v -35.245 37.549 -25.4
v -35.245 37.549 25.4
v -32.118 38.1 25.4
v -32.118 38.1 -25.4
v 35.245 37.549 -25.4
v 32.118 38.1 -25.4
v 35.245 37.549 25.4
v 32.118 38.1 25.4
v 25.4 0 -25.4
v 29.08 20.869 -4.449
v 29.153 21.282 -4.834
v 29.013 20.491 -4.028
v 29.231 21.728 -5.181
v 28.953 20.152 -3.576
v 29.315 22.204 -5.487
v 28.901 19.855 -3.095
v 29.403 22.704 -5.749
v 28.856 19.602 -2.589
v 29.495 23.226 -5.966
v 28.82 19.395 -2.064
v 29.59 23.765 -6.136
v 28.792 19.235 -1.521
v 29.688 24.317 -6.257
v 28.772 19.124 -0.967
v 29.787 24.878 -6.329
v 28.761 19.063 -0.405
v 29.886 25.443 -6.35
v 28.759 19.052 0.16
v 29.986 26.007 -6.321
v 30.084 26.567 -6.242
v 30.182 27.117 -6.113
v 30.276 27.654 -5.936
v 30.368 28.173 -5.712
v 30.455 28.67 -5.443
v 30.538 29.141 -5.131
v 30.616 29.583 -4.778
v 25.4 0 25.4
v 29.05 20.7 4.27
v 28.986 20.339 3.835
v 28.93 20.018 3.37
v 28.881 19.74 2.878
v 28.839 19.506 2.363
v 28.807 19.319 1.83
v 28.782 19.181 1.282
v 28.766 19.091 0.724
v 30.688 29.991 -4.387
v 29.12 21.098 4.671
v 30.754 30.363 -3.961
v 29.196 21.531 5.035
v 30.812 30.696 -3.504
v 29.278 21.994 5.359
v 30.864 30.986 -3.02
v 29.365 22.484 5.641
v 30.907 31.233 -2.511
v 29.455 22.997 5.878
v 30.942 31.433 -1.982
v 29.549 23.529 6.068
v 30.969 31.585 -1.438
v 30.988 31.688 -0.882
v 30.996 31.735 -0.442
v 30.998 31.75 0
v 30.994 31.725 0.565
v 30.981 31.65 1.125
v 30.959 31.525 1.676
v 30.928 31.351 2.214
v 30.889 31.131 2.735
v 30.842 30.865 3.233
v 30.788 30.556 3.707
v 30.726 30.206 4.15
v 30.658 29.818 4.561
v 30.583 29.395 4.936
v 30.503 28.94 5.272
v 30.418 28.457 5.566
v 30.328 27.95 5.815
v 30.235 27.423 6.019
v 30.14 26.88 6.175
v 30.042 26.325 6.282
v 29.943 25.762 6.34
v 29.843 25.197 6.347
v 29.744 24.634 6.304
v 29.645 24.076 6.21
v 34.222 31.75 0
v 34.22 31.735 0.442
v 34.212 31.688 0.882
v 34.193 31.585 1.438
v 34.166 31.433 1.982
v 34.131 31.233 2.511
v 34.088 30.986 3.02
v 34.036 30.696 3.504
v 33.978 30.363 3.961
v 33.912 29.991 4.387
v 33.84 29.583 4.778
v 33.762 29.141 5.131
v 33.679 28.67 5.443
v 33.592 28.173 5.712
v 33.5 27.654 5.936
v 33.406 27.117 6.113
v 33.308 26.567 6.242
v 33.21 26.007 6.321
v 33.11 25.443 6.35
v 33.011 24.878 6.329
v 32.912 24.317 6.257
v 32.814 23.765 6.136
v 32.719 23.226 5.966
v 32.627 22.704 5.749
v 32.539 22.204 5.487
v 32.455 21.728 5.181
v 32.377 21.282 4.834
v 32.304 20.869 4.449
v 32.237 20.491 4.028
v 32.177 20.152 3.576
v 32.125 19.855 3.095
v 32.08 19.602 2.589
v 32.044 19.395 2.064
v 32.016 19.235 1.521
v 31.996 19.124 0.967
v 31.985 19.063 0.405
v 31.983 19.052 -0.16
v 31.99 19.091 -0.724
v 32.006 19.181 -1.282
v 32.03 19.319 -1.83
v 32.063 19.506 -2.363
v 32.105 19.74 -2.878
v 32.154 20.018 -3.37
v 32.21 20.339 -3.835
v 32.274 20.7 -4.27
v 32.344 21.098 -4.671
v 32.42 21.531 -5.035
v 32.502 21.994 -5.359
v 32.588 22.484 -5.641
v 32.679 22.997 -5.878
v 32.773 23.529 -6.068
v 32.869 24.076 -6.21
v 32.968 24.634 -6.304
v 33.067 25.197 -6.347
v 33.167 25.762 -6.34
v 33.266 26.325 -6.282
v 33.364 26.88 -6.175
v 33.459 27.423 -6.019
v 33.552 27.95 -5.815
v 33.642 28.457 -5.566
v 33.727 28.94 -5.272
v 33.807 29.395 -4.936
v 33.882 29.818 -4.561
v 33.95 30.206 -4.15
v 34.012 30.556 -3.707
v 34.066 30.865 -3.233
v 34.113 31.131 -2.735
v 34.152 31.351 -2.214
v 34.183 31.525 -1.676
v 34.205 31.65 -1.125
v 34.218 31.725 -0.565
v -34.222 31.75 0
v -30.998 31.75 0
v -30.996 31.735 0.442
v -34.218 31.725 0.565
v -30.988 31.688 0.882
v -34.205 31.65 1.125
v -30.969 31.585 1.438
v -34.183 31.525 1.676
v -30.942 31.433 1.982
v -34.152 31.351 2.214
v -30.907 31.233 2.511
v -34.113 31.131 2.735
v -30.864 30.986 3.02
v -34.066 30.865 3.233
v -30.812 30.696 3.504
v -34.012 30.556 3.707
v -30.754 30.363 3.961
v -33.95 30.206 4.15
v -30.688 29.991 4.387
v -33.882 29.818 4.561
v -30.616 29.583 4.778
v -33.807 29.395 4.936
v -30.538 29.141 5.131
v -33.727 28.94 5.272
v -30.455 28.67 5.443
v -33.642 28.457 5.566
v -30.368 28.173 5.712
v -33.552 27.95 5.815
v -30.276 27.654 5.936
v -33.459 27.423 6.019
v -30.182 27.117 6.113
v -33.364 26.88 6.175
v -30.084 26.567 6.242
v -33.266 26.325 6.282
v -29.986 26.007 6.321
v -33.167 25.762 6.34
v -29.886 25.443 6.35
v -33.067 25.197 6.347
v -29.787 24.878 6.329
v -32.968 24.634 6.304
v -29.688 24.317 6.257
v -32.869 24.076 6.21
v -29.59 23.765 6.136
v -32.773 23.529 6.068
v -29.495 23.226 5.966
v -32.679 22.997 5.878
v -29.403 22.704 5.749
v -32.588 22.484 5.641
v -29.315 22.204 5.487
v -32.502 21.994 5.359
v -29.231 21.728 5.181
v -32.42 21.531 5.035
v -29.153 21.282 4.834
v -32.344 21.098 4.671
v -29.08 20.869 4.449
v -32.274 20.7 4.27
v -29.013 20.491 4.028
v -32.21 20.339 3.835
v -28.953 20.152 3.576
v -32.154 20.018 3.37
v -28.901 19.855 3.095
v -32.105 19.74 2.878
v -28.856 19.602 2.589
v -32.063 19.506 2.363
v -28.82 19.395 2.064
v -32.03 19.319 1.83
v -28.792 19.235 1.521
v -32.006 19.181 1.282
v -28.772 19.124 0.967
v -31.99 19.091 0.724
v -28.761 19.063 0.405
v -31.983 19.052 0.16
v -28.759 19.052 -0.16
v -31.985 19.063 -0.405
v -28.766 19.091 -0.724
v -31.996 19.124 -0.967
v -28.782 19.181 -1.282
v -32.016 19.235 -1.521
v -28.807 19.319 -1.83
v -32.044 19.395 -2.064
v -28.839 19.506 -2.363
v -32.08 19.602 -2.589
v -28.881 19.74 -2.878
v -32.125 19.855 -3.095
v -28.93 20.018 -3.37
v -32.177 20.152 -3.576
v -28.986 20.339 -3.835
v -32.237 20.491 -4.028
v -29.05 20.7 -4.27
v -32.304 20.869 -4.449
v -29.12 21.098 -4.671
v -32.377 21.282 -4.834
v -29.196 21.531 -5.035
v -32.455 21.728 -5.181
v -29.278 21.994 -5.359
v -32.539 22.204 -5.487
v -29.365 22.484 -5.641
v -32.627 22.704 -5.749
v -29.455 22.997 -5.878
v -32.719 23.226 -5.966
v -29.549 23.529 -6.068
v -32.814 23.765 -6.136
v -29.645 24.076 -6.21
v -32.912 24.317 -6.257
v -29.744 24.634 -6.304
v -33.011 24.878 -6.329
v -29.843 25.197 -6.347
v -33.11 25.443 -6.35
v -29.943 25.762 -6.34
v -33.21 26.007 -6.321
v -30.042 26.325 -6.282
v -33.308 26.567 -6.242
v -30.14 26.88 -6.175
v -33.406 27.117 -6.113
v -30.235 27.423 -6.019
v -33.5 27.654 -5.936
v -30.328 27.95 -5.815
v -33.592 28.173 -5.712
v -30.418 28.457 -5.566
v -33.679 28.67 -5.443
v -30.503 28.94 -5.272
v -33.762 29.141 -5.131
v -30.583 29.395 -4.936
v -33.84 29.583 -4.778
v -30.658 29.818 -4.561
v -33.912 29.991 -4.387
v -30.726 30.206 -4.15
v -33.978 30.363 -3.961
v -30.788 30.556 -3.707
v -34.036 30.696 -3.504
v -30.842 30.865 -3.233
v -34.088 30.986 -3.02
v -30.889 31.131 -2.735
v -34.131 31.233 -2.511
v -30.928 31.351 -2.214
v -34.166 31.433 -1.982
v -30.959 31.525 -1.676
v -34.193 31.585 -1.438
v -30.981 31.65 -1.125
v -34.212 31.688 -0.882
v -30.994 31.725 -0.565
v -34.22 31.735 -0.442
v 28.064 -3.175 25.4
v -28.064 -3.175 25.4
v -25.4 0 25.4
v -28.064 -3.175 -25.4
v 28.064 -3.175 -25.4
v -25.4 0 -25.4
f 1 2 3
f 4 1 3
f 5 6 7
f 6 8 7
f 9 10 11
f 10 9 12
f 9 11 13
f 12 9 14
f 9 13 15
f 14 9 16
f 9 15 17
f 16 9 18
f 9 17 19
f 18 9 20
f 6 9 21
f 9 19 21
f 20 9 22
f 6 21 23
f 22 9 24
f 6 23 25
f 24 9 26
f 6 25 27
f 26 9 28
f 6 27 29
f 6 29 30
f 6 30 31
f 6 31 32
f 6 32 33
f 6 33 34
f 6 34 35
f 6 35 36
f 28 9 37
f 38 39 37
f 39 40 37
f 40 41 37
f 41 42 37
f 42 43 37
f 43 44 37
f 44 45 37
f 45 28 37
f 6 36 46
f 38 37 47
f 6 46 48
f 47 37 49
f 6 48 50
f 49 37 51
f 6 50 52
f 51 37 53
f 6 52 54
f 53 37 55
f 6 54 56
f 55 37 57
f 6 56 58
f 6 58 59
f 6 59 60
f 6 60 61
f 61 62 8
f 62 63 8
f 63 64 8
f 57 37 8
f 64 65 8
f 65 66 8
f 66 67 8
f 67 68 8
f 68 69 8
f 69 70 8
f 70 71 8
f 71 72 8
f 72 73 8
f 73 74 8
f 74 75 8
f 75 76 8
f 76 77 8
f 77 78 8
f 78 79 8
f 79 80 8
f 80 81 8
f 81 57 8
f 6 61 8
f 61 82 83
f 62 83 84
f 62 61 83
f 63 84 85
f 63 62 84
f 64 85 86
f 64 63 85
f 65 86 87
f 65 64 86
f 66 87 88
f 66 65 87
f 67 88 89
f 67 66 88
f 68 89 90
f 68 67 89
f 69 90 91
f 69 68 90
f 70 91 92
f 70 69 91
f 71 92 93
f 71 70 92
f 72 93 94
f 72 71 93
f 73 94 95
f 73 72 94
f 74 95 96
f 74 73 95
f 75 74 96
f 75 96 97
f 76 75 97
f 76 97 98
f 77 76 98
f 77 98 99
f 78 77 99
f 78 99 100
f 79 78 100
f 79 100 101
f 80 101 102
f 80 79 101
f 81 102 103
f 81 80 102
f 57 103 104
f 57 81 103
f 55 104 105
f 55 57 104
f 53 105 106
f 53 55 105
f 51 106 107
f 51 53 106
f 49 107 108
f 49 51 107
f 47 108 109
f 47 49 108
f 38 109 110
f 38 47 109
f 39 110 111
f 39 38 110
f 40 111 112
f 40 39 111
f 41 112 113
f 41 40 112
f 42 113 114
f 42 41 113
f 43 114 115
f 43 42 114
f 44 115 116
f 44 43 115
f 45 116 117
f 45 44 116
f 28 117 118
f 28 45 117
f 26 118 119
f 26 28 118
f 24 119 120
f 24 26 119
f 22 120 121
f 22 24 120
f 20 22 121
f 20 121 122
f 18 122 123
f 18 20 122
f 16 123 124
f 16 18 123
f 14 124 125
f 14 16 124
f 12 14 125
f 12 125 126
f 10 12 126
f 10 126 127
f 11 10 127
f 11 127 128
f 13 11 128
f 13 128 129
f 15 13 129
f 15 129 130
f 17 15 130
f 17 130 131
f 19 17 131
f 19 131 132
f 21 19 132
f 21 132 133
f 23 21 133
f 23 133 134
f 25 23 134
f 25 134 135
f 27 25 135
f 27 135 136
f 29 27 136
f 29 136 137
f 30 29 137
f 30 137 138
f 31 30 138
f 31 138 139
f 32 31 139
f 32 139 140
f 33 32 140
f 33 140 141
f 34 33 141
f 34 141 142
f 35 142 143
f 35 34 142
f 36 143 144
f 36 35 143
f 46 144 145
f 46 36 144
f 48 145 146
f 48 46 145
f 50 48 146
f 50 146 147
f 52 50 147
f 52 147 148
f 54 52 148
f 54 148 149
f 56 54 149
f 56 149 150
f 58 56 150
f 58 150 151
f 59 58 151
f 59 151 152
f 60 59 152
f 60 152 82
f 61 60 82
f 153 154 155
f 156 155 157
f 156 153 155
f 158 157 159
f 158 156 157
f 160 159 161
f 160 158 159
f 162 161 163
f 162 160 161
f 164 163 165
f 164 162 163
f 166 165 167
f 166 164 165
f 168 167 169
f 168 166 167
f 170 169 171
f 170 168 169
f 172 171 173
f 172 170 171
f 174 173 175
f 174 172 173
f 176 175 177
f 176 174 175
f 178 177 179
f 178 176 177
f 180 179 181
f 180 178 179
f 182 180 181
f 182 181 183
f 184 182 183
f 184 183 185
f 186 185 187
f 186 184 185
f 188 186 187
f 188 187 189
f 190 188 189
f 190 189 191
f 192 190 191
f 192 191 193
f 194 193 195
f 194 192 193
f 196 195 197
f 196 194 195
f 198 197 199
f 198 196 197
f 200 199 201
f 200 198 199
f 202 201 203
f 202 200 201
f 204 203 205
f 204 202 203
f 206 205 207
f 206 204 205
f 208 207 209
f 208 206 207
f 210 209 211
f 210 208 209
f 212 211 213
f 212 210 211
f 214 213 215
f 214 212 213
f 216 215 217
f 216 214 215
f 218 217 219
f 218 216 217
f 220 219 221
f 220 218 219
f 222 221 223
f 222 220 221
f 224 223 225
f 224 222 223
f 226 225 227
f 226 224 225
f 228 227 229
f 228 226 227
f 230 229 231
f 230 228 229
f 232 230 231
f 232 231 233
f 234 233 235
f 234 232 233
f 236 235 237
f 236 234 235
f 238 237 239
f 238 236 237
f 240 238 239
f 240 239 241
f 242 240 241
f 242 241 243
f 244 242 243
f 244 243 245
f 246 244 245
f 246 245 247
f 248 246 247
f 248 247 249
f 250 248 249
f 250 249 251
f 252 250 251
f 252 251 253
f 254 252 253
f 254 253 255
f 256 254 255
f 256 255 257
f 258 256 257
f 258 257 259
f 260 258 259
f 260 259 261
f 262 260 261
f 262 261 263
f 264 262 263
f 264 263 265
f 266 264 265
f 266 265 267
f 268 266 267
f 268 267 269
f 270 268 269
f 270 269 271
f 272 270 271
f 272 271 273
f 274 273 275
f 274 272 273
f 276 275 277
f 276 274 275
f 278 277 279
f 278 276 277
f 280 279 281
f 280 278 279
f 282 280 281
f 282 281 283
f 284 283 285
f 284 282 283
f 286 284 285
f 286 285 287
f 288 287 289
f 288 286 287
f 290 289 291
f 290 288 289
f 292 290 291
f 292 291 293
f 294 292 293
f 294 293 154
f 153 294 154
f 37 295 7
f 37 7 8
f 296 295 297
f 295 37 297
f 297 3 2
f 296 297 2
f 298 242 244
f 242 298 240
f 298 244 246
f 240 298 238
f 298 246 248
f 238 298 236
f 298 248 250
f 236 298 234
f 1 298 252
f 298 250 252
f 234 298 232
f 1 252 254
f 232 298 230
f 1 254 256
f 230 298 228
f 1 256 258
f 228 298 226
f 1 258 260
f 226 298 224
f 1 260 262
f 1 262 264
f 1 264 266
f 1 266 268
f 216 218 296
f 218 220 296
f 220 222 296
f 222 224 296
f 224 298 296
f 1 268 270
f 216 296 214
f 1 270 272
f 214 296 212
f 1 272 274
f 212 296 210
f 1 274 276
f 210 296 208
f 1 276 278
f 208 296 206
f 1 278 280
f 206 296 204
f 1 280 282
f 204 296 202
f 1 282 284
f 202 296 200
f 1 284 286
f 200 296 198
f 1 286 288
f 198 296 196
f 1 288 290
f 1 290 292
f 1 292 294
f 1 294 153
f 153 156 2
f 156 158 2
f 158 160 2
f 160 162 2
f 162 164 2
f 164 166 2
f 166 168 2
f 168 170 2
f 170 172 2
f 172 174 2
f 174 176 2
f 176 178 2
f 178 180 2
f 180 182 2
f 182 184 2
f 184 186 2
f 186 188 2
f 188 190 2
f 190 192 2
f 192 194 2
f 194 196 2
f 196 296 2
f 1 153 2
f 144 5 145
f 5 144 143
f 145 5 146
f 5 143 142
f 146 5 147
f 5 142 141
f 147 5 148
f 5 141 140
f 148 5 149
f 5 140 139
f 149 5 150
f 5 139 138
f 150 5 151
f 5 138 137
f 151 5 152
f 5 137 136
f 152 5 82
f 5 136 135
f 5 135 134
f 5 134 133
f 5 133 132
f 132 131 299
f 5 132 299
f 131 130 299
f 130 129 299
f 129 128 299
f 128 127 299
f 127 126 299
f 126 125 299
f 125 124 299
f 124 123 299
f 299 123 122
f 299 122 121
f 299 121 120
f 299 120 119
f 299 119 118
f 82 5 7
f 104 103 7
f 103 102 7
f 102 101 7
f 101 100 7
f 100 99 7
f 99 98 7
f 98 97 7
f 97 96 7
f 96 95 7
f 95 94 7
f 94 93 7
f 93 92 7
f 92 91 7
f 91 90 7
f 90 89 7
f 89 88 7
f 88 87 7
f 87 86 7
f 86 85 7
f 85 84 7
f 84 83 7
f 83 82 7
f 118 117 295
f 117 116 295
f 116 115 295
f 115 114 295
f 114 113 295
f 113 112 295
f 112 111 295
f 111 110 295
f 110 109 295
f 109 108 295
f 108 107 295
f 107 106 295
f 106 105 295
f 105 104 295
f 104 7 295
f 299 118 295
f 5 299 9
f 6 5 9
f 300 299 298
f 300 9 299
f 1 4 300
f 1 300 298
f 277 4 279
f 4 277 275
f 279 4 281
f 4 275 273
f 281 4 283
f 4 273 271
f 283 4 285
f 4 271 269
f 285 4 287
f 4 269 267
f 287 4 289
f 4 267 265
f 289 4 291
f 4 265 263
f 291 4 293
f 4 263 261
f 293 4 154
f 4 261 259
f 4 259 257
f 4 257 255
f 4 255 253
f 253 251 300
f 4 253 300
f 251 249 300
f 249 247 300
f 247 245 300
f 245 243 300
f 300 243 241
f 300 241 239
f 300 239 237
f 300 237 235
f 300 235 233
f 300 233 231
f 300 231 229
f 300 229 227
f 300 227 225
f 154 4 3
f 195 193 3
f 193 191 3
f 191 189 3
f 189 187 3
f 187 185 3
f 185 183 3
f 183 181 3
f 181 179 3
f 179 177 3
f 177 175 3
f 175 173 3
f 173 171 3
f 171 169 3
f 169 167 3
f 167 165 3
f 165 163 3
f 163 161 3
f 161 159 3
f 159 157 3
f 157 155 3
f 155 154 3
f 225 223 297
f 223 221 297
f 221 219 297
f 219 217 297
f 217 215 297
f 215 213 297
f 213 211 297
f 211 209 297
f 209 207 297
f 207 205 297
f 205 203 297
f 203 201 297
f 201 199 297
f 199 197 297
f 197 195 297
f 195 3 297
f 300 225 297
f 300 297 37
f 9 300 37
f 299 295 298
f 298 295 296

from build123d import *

# Parameters (mm, degrees)
BOSS_EXTRUDE1_DEPTH     = 25.4
CUT_EXTRUDE1_DEPTH      = 58.783799795
CUT_EXTRUDE1_DEPTH_BACK = 58.783799795
SKETCH2_R               = 6.35


with BuildPart() as part:
    # Sketch1 → Boss-Extrude1 (new, symmetric)
    with BuildSketch(Plane.XY):
        Polygon((-25.4, 0), (25.4, 0), (32.118057965, 38.1), (35.244822581, 37.548667036), (28.064141329, -3.175), (-28.064141329, -3.175), (-35.244822581, 37.548667036), (-32.118057965, 38.1), align=None)
    extrude(amount=BOSS_EXTRUDE1_DEPTH, both=True)

    # Sketch2 → Cut-Extrude1 (cut, two sides: drawn at the far end of the back side and taken through both)
    with BuildSketch(Plane(origin=(0, 0, 0), x_dir=(0, 0, -1), z_dir=(1, 0, 0)).offset(-CUT_EXTRUDE1_DEPTH_BACK)):
        with Locations(Location((0, 25.4, 0), (0, 0, 90))):
            Circle(SKETCH2_R)
    extrude(amount=CUT_EXTRUDE1_DEPTH + CUT_EXTRUDE1_DEPTH_BACK, mode=Mode.SUBTRACT)


solid = part.part
